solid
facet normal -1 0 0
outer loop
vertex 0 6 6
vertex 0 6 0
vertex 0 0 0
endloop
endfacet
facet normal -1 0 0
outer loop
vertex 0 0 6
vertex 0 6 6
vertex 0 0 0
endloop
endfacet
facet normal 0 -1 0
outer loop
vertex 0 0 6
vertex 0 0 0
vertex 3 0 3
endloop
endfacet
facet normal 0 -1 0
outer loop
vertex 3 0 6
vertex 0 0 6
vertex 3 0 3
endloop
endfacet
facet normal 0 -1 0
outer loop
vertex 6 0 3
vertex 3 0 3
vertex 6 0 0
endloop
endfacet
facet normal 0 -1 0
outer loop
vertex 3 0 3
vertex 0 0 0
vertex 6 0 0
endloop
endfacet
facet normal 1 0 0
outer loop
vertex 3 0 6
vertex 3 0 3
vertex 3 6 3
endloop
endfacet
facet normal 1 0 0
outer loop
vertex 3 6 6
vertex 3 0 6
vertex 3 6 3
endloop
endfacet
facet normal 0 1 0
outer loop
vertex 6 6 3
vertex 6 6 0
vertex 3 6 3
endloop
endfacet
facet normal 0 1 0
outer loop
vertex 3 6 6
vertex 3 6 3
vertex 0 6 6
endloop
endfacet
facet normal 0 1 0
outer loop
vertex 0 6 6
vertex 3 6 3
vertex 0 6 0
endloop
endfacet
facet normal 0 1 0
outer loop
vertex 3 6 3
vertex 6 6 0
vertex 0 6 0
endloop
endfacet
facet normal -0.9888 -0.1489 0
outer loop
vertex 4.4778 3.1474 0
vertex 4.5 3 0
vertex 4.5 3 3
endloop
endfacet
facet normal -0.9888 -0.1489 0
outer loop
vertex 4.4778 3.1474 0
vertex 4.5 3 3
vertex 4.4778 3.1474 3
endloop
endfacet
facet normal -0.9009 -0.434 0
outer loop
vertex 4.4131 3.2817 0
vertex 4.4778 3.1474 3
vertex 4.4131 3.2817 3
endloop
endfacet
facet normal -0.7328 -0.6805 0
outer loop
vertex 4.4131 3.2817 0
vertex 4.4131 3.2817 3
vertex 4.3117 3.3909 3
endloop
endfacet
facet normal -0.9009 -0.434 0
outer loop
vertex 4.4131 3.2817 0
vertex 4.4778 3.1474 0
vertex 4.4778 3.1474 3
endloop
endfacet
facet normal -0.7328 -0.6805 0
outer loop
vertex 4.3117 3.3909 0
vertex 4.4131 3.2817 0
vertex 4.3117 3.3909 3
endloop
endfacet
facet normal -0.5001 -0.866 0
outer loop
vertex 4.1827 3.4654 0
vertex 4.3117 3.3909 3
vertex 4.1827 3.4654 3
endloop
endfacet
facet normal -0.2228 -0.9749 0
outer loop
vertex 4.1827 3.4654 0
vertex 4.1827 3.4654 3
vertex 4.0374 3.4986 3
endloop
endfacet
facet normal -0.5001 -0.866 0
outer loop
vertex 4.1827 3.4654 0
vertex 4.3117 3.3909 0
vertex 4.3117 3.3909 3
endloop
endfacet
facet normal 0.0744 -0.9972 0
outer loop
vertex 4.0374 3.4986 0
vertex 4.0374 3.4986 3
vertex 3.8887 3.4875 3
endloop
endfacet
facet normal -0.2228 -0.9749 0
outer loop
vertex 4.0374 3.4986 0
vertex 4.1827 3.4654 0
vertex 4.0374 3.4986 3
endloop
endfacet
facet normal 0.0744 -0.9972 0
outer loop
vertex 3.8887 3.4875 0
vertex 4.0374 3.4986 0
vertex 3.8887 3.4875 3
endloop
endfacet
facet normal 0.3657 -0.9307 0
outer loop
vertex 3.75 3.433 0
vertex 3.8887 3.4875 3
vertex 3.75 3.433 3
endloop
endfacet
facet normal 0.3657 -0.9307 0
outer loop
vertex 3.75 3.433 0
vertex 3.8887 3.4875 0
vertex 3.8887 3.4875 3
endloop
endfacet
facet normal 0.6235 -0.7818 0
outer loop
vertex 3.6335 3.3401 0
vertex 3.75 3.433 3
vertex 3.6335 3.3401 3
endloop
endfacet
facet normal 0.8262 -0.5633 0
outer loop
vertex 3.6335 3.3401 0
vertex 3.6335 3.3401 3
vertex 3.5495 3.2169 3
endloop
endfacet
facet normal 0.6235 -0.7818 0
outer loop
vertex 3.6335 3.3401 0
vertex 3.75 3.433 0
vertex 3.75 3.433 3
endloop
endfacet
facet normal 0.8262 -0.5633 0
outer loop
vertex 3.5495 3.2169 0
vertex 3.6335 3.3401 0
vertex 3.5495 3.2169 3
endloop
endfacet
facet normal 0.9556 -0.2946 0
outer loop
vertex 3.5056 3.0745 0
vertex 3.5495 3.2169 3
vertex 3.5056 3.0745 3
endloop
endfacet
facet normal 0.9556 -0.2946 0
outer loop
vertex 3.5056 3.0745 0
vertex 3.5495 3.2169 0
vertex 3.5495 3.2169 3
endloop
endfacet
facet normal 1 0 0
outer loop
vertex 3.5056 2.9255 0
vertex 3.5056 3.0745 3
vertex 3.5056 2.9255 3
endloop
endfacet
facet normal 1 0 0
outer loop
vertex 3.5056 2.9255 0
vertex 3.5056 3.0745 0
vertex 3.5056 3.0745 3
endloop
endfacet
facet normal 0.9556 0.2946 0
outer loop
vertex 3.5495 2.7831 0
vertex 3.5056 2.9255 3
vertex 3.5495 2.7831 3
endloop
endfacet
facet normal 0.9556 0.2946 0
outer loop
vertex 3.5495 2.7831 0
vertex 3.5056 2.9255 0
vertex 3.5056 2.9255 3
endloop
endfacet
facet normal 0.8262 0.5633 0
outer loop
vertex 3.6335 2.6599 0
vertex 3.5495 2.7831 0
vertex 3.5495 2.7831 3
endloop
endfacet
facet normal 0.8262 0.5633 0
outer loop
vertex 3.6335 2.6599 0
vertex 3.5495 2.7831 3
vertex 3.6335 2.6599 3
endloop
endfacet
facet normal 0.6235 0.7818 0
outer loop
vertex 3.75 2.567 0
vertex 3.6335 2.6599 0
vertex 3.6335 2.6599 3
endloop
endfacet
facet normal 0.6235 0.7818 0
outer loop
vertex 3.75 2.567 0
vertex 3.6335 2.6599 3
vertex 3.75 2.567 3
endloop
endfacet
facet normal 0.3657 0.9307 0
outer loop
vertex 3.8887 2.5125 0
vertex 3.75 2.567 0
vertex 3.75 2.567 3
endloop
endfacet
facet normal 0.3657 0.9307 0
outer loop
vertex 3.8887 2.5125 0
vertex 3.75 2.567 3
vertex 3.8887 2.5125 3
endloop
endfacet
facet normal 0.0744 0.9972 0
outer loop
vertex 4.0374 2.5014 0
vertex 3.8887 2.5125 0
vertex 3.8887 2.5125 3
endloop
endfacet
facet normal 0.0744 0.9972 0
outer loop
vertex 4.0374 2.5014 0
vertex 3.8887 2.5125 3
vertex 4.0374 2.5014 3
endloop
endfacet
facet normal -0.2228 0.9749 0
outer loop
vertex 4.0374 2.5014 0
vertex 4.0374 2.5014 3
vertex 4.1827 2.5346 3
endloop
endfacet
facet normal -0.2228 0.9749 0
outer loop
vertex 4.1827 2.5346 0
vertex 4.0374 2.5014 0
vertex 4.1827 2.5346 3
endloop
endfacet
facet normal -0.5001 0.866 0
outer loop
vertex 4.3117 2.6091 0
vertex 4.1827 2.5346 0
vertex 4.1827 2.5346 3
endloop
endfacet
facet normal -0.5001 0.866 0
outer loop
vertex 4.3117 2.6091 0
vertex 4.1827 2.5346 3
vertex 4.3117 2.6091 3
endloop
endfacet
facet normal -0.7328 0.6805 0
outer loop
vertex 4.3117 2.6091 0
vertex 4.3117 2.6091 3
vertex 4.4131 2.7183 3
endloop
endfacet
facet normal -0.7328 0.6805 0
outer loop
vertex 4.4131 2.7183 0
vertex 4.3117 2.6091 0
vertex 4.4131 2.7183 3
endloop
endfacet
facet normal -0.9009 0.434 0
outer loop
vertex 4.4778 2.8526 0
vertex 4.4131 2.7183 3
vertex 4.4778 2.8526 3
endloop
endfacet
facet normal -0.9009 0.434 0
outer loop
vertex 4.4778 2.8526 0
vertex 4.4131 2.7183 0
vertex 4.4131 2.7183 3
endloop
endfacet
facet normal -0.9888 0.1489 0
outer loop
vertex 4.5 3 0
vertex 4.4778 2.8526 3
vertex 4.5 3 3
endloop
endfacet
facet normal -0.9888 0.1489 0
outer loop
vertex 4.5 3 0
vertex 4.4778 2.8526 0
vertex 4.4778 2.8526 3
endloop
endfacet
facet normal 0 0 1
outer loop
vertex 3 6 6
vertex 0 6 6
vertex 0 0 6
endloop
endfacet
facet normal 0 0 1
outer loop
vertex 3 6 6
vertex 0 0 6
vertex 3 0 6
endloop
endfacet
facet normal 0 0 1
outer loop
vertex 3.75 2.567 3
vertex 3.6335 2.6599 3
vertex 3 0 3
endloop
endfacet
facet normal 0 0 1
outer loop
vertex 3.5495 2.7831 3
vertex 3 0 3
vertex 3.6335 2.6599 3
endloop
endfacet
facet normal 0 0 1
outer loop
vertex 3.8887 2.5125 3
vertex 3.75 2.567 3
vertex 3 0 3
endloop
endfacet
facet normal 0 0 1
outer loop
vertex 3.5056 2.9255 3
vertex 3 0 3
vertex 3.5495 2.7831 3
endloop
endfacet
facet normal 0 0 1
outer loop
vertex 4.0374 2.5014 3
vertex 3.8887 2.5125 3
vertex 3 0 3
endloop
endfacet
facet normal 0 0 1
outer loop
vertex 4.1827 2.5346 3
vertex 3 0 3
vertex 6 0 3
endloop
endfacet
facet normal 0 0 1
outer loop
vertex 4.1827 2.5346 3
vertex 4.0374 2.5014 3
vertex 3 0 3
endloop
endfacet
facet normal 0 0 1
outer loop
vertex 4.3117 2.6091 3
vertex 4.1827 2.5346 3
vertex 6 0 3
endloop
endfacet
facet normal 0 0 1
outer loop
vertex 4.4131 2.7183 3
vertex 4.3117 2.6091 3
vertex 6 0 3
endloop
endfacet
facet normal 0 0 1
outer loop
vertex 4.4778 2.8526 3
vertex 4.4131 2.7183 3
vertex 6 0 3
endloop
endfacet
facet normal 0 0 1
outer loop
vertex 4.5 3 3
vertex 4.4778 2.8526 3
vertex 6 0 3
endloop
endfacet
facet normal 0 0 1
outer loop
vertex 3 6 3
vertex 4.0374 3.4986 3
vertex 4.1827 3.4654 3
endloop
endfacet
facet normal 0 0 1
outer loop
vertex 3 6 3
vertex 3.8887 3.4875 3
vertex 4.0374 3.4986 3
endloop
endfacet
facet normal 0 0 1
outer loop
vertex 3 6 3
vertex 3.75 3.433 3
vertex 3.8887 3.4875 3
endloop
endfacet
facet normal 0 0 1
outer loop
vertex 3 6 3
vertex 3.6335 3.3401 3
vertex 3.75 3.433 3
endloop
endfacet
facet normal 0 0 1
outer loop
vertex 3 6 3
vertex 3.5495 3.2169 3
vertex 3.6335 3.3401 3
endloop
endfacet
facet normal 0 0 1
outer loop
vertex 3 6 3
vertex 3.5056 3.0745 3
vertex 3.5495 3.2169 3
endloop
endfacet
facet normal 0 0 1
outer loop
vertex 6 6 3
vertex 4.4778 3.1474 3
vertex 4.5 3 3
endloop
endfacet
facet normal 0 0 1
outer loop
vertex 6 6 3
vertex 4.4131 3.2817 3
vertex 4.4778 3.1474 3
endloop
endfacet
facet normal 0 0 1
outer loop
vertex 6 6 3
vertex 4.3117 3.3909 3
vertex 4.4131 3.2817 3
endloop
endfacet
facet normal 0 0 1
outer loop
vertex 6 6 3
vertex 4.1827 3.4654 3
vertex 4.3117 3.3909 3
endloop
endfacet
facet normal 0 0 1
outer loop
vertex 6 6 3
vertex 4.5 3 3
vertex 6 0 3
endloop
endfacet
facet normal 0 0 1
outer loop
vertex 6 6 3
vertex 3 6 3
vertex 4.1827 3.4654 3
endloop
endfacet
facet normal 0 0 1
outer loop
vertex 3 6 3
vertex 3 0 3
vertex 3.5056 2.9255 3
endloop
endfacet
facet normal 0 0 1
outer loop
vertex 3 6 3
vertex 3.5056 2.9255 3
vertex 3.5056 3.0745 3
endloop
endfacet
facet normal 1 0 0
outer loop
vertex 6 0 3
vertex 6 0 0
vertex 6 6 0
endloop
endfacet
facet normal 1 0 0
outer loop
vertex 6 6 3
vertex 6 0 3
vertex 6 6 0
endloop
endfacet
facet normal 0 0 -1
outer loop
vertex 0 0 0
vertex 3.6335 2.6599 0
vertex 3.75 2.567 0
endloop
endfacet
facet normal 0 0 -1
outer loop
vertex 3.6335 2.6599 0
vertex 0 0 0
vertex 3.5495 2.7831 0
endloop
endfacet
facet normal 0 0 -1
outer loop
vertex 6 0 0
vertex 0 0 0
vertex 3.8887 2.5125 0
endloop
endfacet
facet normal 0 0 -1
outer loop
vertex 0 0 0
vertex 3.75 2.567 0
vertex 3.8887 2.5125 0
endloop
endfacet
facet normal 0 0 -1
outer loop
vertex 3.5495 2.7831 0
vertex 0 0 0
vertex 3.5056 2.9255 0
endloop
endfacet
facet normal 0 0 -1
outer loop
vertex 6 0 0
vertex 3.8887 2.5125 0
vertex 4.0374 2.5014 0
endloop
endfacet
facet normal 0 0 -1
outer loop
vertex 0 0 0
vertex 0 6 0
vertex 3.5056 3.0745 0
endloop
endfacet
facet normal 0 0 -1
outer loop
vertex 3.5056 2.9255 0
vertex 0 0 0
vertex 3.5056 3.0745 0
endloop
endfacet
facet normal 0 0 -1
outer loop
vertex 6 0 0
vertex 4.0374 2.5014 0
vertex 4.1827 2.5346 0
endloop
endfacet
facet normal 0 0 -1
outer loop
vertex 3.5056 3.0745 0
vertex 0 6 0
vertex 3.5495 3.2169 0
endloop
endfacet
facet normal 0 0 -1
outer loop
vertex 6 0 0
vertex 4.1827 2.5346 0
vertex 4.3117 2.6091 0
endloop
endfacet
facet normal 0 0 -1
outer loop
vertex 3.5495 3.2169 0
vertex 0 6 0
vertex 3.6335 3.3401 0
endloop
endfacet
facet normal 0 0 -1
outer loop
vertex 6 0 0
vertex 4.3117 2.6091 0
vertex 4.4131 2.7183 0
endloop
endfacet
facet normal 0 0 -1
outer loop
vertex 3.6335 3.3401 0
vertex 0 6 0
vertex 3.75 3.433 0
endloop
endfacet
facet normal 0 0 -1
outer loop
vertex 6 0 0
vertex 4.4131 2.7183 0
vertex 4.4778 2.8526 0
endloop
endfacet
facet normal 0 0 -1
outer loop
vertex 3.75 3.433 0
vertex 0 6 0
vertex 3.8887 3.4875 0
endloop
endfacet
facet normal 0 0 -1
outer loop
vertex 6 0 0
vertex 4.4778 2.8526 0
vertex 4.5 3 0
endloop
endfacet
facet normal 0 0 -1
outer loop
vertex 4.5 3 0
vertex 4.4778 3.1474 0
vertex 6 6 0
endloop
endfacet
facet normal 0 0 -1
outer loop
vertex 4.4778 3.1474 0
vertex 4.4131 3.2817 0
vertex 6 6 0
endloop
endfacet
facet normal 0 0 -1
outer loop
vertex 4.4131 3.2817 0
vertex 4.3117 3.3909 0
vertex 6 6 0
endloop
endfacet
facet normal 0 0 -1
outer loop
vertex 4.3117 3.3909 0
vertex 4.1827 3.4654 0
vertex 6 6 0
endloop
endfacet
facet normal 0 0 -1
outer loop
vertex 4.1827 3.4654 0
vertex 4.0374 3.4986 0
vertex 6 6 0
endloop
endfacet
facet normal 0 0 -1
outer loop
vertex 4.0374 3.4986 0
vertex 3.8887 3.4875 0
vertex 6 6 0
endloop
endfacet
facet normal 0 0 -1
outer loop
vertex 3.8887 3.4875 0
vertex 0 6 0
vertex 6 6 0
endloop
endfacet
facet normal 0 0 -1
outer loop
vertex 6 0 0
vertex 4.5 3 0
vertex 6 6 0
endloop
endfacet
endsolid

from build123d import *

# Parameters (mm, degrees)
F0_R     = 0.5
F1_DEPTH = 3
F2_W     = 3
F2_H     = 6
F3_DEPTH = 6


with BuildPart() as f1:
    # F0 (on Top) → F1 (new body)
    with BuildSketch(Plane.XY):
        Polygon((0, 6), (0, 0), (6, 0), (6, 6), (4, 6), align=None)
        with Locations((4, 3)):
            Circle(F0_R, mode=Mode.SUBTRACT)
    extrude(amount=F1_DEPTH)

    # F2 (on Top) → F3 (join)
    with BuildSketch(Plane.XY):
        with Locations((1.5, 3)):
            Rectangle(F2_W, F2_H)
    extrude(amount=F3_DEPTH)


solid = f1.part
